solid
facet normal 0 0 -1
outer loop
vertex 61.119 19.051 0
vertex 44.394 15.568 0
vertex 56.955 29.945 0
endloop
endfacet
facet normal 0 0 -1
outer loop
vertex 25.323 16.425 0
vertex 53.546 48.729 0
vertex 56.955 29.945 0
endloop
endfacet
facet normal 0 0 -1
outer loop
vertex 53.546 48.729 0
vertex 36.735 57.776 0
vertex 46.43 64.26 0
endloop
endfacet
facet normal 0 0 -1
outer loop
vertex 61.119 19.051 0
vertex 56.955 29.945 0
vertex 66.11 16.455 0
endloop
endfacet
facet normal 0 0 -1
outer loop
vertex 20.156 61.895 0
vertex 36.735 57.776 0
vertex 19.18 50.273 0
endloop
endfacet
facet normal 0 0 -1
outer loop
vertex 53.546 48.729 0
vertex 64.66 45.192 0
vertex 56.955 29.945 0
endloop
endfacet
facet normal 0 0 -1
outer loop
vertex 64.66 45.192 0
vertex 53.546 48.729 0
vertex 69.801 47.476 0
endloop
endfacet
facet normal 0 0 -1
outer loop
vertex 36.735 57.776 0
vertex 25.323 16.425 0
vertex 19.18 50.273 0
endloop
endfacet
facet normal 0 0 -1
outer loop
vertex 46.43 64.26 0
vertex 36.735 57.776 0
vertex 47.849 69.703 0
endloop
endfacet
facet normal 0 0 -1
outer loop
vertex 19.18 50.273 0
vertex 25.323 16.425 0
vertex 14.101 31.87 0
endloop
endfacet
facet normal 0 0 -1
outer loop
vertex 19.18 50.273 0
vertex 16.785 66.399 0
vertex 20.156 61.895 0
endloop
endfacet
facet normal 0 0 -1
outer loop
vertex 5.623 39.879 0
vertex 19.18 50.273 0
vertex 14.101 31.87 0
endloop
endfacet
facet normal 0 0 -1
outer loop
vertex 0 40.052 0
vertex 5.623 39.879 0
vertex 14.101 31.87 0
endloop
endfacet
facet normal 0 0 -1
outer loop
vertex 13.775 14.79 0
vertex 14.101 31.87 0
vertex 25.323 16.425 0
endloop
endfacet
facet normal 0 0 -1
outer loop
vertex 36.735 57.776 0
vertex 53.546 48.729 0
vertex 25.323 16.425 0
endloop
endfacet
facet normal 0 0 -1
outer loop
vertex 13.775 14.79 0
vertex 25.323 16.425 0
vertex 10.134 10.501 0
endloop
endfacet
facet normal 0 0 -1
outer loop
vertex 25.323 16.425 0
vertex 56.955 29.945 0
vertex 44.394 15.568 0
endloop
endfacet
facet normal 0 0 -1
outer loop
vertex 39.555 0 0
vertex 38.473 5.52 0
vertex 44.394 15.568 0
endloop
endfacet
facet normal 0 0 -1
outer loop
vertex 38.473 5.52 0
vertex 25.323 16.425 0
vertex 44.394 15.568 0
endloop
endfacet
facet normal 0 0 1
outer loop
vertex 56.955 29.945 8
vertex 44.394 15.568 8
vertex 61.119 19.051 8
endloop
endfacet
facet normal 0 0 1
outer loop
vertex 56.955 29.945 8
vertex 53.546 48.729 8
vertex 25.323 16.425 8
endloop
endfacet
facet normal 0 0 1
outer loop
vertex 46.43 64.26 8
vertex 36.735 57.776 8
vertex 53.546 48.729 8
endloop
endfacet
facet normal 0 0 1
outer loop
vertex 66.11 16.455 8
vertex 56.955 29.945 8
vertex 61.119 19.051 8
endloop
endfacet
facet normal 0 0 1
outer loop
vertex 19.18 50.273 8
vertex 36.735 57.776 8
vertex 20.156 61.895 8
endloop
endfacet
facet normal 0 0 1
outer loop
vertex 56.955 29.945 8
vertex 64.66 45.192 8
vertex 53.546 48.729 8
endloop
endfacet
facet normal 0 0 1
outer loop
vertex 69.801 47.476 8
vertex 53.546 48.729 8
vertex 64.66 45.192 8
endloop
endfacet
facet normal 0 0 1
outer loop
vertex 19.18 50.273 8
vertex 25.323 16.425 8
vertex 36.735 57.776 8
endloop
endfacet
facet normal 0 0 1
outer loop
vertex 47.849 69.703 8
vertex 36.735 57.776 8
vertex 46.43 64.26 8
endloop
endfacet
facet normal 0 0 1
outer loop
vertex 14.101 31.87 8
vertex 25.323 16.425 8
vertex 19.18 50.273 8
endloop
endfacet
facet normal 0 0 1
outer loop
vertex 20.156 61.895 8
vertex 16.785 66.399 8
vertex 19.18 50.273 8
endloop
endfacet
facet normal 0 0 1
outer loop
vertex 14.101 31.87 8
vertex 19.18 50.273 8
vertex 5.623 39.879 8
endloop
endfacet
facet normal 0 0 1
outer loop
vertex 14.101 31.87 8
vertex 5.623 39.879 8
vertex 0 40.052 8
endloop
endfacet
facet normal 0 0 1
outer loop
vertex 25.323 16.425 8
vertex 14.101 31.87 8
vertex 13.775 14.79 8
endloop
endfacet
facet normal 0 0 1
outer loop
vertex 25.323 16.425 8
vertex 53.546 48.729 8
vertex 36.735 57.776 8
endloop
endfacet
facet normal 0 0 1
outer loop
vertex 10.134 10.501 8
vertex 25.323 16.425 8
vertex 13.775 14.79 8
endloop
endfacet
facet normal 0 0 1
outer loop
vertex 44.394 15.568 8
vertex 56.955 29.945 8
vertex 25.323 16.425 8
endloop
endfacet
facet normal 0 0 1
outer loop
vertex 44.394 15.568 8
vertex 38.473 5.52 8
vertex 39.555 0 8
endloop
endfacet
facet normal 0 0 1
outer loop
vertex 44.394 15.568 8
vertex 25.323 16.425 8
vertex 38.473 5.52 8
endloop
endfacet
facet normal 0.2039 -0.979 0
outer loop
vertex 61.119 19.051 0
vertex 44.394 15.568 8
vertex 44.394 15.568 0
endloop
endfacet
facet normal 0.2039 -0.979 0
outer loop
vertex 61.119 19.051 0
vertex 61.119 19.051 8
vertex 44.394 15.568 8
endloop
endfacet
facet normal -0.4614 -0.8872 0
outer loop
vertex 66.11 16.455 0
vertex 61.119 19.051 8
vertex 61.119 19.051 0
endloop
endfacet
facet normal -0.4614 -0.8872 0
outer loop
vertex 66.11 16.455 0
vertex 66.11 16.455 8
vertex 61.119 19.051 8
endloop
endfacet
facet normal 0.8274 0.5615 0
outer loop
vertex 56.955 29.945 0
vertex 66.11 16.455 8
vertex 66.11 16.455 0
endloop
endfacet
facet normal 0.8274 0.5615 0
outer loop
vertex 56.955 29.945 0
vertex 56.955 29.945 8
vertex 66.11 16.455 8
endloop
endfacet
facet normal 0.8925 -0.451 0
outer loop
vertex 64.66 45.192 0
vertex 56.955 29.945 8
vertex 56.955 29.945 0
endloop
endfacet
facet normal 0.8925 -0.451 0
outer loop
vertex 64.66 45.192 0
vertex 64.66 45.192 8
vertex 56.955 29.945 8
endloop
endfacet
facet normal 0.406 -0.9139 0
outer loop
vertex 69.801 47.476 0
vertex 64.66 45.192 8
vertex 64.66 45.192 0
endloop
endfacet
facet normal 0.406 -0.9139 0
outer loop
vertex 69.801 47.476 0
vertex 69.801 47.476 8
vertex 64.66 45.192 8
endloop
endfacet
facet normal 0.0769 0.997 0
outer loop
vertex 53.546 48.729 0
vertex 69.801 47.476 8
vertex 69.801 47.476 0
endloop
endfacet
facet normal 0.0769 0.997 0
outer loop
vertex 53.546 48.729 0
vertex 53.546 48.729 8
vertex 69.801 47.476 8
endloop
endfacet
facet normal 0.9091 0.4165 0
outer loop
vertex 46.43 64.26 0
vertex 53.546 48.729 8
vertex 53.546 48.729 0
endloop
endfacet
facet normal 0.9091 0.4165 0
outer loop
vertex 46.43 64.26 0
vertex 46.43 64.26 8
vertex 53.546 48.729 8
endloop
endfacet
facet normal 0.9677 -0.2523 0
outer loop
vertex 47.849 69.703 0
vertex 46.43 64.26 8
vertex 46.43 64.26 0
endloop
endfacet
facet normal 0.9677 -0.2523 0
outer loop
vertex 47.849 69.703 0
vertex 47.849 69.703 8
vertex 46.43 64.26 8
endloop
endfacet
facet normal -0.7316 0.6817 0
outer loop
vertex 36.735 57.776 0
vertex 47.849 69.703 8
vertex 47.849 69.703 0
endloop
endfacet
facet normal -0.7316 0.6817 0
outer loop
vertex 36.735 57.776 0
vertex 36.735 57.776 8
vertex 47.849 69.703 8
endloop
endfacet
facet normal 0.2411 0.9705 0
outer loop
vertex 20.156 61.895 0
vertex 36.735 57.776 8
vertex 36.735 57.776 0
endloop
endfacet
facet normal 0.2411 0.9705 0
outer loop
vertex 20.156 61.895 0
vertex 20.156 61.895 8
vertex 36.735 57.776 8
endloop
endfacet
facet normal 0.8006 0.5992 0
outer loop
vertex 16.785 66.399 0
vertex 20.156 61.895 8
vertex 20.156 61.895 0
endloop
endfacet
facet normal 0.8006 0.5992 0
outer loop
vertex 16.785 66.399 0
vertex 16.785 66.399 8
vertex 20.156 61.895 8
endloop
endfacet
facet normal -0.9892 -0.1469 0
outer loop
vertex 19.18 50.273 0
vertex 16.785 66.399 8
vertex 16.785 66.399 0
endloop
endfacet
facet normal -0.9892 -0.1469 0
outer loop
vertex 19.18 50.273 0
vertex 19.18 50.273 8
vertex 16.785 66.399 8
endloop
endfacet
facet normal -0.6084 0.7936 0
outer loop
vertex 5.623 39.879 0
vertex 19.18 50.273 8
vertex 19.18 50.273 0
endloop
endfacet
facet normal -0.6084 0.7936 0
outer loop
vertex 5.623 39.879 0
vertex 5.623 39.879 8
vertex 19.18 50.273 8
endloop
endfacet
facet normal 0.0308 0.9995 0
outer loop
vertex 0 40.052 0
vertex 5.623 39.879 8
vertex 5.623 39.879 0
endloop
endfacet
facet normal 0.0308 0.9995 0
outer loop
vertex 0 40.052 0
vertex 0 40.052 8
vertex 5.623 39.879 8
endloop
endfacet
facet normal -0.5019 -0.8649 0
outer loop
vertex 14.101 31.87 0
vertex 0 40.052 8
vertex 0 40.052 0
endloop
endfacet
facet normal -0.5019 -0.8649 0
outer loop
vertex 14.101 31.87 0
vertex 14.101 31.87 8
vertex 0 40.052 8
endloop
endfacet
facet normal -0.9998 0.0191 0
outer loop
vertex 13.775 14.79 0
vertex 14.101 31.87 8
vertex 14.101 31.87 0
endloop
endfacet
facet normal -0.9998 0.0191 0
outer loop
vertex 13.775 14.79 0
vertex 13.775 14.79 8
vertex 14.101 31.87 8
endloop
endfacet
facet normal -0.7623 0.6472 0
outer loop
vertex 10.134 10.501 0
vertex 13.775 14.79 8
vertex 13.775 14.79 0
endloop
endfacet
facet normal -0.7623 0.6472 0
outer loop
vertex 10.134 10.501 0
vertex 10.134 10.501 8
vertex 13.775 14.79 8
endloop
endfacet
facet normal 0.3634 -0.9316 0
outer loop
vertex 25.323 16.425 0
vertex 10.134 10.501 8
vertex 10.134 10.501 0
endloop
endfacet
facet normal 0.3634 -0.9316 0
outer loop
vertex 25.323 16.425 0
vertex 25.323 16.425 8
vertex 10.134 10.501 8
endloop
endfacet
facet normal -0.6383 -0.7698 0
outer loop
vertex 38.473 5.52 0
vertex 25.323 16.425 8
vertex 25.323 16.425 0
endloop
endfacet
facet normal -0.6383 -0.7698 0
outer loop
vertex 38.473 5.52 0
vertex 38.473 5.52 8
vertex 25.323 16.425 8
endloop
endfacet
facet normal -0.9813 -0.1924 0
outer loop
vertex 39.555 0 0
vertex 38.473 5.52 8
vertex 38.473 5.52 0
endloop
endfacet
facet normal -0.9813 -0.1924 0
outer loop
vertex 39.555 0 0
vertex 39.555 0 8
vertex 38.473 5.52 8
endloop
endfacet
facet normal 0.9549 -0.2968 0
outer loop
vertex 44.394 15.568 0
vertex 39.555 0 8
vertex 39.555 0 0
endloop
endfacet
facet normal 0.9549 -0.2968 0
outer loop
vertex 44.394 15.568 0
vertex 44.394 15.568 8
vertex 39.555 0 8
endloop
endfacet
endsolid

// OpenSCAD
$fn = 32;

// ----------------------------------------------------------------------
// Fan rotor section: 7 blades, 22 mm hub radius, 14 mm blades
// ----------------------------------------------------------------------

// --- parameters (mm) ---
profile_height = 8;       // extrusion height
profile_points = 21;      // points of the closed outline

profile = [[56.955, 29.945], [64.66, 45.192], [69.801, 47.476], [53.546, 48.729], [46.43, 64.26], [47.849, 69.703], [36.735, 57.776], [20.156, 61.895], [16.785, 66.399], [19.18, 50.273], [5.623, 39.879], [0, 40.052], [14.101, 31.87], [13.775, 14.79], [10.134, 10.501], [25.323, 16.425], [38.473, 5.52], [39.555, 0], [44.394, 15.568], [61.119, 19.051], [66.11, 16.455]];  // single closed polygon, 21 points, counter clockwise

// --- the one profile operation ---
linear_extrude(height = profile_height) polygon(points = profile);
